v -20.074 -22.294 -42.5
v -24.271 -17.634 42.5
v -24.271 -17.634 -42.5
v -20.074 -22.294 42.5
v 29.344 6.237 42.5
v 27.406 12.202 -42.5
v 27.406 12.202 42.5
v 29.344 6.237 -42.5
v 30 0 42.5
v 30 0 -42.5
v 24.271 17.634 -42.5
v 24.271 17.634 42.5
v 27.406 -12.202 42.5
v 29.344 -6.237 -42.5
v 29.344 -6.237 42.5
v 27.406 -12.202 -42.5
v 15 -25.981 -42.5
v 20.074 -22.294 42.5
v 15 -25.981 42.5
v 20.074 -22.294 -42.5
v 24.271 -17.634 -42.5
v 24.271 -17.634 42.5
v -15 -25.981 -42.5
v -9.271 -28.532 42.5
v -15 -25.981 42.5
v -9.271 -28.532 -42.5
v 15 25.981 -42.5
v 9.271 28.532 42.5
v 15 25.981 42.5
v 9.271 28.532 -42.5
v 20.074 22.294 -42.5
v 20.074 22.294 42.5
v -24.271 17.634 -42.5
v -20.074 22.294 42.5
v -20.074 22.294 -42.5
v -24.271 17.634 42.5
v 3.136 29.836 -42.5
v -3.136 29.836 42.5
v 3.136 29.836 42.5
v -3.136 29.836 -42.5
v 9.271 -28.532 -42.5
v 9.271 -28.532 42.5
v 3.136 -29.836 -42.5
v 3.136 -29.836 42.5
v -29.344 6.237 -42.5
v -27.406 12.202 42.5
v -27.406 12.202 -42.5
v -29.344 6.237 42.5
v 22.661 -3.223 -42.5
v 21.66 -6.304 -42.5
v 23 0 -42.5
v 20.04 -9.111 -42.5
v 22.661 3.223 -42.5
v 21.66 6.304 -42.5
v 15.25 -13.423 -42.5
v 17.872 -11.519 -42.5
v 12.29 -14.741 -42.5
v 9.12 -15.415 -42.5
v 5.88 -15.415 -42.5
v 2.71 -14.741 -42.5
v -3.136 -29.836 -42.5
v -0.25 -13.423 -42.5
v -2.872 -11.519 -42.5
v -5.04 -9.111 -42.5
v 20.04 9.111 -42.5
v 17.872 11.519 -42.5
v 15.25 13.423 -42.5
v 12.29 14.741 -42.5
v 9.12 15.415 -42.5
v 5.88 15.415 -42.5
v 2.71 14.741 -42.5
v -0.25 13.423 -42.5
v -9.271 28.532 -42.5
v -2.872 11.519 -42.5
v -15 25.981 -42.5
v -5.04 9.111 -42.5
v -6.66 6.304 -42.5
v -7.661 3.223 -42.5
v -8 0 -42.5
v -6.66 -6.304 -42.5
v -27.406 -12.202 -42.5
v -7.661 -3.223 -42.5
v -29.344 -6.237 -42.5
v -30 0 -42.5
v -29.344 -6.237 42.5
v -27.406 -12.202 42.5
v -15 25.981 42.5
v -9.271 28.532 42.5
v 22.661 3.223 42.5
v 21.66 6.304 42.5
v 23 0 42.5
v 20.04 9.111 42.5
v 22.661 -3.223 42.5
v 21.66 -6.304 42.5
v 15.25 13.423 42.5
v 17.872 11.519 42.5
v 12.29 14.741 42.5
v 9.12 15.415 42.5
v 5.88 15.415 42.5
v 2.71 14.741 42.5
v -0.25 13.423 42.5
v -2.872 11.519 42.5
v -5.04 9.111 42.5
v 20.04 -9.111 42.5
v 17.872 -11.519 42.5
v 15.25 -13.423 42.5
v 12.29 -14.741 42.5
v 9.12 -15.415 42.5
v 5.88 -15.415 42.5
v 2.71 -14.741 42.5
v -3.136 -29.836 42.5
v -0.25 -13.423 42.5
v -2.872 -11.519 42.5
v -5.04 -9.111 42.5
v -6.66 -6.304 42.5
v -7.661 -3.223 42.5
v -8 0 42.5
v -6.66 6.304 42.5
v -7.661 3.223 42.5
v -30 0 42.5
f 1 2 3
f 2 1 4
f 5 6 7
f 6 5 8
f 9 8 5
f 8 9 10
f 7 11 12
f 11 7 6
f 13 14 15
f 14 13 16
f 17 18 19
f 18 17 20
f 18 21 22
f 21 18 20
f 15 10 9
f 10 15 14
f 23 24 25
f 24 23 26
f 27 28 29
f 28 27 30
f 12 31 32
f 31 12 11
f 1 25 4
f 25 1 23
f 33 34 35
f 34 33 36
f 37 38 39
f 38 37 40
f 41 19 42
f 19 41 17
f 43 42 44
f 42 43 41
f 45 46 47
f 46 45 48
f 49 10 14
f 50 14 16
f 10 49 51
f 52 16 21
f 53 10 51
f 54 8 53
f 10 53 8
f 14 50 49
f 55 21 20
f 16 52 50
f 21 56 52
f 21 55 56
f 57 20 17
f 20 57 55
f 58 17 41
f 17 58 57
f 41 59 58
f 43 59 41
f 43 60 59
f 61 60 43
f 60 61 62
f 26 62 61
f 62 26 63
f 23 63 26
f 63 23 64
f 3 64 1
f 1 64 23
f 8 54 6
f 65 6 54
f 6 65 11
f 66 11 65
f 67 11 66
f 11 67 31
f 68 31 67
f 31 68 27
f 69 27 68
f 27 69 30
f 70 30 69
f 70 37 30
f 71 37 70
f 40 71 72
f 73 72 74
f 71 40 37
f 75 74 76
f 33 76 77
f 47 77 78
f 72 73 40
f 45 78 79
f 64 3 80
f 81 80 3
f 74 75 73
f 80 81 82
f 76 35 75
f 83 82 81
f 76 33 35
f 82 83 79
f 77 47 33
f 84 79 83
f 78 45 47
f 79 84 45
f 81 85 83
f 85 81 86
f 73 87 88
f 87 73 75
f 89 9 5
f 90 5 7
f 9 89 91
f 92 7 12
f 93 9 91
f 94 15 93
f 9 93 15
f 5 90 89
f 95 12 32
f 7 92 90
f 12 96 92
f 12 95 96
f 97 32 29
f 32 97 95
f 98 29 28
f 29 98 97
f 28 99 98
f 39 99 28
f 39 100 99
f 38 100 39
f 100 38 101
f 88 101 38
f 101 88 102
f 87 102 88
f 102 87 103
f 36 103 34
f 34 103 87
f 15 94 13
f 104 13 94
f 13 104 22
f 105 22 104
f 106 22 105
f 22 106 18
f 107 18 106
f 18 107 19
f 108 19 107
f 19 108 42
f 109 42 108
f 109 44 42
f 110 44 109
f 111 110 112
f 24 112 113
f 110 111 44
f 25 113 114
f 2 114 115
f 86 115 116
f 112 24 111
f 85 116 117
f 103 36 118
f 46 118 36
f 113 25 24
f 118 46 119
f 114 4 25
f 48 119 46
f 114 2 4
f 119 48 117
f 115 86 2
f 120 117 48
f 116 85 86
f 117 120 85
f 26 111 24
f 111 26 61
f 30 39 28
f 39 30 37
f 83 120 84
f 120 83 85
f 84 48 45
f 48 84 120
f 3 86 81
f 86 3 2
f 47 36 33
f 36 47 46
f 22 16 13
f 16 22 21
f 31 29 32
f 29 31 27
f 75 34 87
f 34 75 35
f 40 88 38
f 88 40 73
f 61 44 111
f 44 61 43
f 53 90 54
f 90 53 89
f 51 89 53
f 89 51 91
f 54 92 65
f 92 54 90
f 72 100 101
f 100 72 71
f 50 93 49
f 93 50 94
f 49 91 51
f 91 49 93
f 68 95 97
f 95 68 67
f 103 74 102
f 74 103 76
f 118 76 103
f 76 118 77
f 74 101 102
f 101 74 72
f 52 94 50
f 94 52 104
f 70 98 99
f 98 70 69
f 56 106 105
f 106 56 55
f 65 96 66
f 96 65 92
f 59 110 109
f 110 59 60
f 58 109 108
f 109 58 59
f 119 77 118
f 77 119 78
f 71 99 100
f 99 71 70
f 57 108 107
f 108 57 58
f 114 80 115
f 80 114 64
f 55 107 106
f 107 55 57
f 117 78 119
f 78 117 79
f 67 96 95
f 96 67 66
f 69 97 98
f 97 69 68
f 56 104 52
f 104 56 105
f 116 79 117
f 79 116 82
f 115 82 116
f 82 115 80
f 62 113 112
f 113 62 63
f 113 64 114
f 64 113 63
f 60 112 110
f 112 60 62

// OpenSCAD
//pezzo finito ma senza cambio parametri

/*camicia();

module camicia(R,R1,H,H1,resolution) {
difference(){
    ce(30,85,30);
   translate([7.5,0,0])
    ci(15.5,90,30);
}

module ci(R,H,resolution)
 cylinder(r=R,h=H1,$fn=resolution,center=true);
module ce(R1,H,resolution)
 cylinder(r=R1,h=H,fn=resolution,center=true);
 } 
 */
camicia(15.5,30,85,30);

module camicia(Ri,Re,H,resolution) {
difference(){
    ce(Re,H,resolution);
   translate([7.5,0,0])
    ci(Ri,H,resolution);
}

module ci(Ri,H,resolution)
 cylinder(r=Ri,h=H+2,$fn=resolution,center=true);
module ce(Re,H,resolution)
 cylinder(r=Re,h=H,$fn=resolution,center=true);
 }
